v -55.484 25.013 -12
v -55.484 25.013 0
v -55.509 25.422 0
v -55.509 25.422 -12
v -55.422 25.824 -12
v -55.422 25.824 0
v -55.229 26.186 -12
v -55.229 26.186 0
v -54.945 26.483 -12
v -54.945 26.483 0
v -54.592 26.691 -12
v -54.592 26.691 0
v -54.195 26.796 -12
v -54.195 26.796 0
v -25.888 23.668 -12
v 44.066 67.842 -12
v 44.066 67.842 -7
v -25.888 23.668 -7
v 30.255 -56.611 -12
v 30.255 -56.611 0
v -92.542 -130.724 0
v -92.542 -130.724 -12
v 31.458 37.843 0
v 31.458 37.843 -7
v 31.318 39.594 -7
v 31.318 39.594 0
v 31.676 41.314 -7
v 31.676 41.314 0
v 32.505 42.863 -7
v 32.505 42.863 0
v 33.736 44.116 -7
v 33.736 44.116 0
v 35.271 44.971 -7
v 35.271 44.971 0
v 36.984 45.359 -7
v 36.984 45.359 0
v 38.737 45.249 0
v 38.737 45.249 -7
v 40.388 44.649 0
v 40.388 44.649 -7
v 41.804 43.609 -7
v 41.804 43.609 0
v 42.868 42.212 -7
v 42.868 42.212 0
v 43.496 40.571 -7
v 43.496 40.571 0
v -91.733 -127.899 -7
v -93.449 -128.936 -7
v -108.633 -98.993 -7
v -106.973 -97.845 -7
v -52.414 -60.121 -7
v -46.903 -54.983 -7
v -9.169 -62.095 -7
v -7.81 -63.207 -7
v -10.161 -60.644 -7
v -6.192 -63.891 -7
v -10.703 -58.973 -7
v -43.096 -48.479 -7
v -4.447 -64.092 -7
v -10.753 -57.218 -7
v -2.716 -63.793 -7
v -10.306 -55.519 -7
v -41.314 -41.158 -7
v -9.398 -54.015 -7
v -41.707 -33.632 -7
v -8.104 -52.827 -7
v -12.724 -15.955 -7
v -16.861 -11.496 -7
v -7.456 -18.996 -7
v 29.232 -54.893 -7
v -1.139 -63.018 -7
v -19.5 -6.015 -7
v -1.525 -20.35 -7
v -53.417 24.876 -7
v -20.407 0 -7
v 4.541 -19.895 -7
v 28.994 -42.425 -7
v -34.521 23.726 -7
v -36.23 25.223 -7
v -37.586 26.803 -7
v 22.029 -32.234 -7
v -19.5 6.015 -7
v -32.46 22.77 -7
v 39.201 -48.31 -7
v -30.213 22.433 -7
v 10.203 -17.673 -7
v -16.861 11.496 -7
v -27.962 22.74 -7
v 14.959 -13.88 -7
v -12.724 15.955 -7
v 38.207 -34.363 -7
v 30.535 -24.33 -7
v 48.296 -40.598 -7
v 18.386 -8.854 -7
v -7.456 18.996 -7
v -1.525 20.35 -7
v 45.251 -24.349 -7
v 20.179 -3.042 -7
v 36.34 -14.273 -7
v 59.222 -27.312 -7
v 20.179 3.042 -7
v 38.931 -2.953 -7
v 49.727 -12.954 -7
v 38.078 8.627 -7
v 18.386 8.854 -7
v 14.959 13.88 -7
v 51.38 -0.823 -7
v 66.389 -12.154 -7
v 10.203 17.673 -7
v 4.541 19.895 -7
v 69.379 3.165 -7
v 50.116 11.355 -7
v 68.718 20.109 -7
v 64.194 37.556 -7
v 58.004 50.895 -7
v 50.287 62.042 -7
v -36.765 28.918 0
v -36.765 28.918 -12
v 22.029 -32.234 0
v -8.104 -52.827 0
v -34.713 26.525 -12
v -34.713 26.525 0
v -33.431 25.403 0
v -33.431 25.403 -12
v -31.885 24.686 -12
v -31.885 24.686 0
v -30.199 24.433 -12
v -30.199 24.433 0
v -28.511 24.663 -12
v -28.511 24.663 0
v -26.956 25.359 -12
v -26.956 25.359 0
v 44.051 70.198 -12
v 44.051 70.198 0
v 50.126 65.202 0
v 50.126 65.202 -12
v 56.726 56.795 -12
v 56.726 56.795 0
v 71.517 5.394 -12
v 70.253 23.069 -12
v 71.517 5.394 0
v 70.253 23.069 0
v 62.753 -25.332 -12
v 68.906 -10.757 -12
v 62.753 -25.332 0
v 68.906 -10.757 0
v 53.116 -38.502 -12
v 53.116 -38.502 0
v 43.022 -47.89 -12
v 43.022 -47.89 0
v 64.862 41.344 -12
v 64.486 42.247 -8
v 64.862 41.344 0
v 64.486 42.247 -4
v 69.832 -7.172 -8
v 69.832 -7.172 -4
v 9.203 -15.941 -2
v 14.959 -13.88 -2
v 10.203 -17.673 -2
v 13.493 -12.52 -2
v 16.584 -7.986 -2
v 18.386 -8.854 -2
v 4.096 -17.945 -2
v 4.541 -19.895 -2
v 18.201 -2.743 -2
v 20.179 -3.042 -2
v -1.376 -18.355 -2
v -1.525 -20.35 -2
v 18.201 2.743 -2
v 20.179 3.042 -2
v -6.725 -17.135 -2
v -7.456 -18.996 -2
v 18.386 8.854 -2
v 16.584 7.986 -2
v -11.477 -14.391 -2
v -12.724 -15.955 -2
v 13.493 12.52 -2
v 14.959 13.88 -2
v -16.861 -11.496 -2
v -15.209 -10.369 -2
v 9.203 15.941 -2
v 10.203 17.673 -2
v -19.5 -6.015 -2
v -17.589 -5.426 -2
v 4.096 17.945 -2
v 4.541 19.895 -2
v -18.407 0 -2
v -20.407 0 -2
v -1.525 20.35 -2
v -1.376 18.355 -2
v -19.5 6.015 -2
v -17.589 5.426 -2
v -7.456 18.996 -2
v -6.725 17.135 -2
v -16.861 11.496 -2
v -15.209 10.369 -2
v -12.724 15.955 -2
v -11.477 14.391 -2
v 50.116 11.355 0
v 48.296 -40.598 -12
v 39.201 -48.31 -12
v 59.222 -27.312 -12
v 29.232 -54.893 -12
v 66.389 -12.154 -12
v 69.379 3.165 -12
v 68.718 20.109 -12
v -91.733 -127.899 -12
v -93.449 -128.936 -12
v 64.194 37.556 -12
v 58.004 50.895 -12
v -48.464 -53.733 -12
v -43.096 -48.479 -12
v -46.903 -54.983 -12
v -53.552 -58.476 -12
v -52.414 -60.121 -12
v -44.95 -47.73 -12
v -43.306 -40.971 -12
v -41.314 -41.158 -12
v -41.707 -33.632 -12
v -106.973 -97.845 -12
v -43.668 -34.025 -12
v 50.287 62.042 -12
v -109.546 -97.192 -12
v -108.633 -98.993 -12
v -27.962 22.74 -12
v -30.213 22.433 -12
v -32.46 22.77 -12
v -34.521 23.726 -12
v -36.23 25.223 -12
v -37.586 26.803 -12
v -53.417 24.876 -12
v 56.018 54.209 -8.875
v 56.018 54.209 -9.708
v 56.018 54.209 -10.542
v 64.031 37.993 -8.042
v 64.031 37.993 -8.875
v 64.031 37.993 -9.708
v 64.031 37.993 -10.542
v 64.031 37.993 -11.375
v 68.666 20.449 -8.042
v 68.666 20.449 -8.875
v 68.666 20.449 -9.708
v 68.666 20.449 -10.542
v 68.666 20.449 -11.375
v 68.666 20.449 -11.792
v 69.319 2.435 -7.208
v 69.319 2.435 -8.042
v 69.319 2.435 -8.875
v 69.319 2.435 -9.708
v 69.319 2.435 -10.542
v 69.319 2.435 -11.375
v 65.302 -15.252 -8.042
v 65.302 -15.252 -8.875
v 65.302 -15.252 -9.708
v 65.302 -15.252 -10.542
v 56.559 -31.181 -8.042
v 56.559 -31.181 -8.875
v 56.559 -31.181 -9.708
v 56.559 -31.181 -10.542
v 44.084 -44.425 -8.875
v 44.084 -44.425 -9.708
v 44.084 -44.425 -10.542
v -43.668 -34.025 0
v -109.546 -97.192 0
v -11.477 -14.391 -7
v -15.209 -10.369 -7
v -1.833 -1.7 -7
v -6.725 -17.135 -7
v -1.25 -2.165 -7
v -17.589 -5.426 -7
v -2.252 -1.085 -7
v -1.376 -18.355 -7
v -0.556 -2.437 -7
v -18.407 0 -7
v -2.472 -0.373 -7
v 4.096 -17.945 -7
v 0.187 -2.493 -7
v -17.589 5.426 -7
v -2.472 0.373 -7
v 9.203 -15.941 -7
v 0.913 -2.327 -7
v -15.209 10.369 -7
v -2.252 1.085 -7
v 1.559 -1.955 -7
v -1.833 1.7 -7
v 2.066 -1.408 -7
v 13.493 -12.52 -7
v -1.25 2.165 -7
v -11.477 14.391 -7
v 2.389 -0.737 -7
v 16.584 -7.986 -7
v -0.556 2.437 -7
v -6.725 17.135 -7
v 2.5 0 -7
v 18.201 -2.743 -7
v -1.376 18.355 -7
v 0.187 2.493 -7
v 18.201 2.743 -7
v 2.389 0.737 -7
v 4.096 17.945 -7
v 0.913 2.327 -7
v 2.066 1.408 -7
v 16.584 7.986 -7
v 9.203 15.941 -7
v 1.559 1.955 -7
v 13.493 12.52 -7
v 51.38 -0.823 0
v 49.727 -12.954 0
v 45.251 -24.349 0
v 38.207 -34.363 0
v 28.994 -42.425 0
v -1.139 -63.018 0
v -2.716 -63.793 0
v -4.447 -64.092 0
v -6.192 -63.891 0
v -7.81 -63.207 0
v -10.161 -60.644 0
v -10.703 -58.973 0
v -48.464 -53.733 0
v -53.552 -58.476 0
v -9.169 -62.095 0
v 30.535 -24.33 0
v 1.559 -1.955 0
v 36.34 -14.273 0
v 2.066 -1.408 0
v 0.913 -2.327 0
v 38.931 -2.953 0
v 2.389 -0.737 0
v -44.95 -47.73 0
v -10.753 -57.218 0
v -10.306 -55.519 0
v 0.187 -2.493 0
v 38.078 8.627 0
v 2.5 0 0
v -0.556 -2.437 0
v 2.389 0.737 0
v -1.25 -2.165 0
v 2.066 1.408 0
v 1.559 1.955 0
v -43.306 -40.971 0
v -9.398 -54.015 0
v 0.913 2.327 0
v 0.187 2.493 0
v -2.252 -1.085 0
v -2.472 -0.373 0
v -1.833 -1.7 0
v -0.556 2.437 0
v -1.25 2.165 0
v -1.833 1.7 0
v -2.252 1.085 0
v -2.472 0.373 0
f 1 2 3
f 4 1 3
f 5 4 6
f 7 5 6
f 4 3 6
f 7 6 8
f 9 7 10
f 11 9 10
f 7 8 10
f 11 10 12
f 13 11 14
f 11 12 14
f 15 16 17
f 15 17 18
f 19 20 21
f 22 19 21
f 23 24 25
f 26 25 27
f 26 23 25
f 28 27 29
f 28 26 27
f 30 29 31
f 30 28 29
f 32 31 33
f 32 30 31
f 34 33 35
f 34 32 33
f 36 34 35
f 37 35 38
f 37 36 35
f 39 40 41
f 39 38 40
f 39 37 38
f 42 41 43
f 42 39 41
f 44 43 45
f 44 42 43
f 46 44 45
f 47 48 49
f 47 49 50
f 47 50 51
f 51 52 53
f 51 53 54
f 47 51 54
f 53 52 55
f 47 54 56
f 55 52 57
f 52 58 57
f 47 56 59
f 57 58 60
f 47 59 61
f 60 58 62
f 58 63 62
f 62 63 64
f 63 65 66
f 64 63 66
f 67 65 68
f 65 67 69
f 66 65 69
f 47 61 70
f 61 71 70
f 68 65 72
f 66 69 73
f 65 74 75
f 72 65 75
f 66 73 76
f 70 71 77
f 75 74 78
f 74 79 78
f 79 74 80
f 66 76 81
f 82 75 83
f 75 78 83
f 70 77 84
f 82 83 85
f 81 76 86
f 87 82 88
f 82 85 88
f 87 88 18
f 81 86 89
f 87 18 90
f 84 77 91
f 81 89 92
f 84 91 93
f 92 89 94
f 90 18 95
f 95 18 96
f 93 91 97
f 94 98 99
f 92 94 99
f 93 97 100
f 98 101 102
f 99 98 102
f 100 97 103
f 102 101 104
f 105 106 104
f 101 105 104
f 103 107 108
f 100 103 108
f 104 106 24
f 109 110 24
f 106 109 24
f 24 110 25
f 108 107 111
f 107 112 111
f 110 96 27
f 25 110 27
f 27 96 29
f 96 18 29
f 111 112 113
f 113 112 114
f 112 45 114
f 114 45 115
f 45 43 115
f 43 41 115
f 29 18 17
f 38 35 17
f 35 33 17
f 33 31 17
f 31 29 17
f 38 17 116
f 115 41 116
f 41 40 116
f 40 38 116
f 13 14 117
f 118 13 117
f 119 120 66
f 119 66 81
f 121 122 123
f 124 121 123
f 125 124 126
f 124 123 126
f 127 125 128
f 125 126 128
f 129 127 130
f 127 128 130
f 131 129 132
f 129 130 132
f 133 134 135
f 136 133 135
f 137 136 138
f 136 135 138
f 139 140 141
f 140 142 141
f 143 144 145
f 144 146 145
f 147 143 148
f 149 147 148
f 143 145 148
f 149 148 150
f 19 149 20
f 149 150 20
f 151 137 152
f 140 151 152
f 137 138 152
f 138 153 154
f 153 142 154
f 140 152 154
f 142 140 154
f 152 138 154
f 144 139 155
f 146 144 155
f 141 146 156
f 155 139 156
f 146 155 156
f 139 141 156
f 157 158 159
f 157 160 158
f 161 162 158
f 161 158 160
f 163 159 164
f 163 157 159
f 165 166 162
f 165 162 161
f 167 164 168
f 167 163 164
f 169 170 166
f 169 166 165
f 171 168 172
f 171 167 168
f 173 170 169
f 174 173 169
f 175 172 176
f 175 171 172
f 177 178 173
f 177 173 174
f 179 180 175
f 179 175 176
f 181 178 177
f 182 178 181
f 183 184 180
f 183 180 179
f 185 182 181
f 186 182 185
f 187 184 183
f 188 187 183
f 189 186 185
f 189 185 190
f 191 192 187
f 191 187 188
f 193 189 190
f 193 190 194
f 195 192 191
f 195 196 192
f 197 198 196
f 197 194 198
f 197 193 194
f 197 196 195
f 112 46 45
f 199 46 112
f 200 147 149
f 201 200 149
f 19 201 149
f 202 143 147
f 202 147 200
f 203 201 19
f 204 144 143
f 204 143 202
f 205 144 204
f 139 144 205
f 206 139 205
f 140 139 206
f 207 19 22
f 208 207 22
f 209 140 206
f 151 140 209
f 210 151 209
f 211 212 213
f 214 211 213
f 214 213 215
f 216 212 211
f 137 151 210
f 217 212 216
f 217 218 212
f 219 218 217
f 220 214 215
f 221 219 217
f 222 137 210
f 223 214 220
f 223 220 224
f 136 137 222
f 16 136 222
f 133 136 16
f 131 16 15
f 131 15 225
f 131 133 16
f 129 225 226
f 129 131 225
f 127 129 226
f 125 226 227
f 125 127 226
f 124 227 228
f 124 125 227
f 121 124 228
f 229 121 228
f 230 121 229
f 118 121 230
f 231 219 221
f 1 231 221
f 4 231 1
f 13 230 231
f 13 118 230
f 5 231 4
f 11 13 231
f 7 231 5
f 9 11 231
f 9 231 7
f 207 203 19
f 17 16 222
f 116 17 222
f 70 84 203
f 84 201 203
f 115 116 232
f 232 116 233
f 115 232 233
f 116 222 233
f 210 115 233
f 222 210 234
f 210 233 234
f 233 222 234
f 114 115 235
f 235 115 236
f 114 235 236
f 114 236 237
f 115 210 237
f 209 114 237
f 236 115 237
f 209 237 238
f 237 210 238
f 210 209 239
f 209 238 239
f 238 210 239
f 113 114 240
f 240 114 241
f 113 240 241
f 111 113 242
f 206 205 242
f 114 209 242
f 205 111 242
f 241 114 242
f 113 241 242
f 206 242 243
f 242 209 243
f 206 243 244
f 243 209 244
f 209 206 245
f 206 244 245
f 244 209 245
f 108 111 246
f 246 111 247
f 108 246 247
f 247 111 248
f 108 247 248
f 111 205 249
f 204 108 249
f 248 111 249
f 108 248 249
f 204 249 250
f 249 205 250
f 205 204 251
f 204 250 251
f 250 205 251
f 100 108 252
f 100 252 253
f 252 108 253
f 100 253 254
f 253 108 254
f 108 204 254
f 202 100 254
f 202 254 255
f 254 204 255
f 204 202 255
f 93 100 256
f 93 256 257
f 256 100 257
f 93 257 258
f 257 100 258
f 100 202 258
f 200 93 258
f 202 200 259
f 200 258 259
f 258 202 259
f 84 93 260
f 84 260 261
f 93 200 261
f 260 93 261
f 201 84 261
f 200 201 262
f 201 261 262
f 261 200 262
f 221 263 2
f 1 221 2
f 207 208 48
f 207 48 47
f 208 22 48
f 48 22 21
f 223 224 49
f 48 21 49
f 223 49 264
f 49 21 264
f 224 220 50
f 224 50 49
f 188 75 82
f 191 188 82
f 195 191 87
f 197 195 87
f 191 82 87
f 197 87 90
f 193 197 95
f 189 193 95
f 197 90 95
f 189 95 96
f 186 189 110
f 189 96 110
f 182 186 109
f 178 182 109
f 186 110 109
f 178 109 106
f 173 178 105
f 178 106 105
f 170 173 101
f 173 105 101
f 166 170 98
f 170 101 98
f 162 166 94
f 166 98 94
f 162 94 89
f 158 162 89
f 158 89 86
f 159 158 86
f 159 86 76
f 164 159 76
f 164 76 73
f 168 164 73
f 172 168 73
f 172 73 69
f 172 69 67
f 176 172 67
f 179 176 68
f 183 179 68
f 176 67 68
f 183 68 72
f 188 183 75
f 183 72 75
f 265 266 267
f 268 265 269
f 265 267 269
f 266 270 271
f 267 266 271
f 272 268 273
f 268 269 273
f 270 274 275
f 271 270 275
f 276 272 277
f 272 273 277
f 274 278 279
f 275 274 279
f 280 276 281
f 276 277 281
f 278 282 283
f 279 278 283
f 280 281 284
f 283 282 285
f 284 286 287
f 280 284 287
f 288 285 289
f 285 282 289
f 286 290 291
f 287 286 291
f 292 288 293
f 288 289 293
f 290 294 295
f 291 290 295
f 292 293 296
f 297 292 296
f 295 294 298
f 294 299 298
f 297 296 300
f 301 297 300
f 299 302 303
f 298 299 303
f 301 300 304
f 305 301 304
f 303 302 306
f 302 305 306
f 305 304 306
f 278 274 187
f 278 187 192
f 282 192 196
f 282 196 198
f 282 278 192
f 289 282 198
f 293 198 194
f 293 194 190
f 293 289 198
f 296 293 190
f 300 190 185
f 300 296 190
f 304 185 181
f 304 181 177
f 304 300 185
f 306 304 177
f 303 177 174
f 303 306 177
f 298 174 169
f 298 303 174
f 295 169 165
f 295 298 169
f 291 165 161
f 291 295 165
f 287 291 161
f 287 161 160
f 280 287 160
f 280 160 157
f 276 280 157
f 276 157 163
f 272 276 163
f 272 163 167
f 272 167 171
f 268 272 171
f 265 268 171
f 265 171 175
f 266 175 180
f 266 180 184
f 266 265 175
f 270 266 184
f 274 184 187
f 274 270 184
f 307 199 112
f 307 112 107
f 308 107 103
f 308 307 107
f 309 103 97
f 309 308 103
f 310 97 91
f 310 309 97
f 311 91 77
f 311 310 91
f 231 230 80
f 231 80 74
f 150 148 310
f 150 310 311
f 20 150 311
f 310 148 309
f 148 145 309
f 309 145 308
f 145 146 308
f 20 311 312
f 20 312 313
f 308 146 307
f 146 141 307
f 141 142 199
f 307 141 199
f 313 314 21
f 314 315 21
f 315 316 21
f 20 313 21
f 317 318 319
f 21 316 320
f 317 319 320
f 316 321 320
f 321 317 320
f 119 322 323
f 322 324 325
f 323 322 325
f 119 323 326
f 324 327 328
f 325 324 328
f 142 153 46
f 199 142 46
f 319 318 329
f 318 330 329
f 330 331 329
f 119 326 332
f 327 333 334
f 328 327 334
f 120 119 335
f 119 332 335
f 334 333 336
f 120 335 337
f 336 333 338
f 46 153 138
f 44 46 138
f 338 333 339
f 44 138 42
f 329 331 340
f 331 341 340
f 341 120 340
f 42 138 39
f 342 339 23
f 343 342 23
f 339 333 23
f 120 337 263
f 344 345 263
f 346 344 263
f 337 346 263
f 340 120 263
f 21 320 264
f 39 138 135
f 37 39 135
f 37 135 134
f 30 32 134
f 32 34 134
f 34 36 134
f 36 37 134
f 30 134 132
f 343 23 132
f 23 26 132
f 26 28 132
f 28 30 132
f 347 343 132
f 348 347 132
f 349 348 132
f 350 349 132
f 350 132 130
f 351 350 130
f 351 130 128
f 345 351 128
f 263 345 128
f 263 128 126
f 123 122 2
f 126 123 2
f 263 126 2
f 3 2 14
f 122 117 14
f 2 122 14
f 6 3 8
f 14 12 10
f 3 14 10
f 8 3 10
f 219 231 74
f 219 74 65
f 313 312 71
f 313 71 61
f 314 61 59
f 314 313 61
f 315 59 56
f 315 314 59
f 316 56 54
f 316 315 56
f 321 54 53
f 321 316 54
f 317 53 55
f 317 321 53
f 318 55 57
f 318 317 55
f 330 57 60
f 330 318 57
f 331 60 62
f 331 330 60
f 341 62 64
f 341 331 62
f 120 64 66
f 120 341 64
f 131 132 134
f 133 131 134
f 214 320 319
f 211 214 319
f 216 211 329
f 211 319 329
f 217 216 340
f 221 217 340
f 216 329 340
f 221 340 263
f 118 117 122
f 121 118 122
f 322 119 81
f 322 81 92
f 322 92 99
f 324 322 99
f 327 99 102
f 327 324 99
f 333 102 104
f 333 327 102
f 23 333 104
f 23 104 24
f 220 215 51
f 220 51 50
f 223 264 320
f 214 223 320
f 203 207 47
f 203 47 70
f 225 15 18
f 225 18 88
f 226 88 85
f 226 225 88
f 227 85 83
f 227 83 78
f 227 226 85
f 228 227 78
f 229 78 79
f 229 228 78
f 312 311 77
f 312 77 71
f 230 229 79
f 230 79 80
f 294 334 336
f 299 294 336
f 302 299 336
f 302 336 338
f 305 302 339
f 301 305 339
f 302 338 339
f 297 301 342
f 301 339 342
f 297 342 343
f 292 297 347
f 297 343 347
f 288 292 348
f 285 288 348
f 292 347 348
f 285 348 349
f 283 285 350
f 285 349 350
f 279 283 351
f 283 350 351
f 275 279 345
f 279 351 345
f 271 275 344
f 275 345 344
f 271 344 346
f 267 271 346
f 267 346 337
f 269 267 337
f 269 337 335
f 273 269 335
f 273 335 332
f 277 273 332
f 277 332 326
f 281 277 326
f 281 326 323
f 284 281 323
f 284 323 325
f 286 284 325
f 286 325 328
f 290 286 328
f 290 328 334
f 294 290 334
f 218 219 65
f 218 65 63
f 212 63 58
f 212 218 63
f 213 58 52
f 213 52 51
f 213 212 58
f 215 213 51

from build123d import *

# Parameters (mm, degrees)
SKETCH1_R           = 2.5
BOSS_EXTRUDE1_DEPTH = 12
CUT_EXTRUDE2_DEPTH  = 5
SKETCH2_R           = 20.406966807
SKETCH2_R_2         = 18.406966807
CUT_EXTRUDE1_DEPTH  = 5


with BuildPart() as part:
    # Sketch1 → Boss-Extrude1 (new body)
    with BuildSketch(Plane.XY):
        with BuildLine():
            Line((-26.955627075, 25.359398414), (44.050751749, 70.198338512))
            add(Edge.make_bspline(
                [(44.050751749, 70.198338512), (62.087157858, 60.129124735), (102.236821697, -14.309839041), (30.255220871, -56.610877482)],
                knots=[0, 0, 0, 0, 1, 1, 1, 1], degree=3))
            Line((30.255220871, -56.610877482), (-92.542495842, -130.724182913))
            Line((-92.542495842, -130.724182913), (-109.546280871, -97.192243206))
            Line((-109.546280871, -97.192243206), (-53.551819625, -58.475967995))
            ThreePointArc((-53.551819625, -58.475967995), (-44.950344781, -47.729789478), (-43.667906214, -34.025006607))
            Line((-43.667906214, -34.025006607), (-55.484471769, 25.012678553))
            ThreePointArc((-55.484471769, 25.012678553), (-55.229156607, 26.186005417), (-54.194896814, 26.796077907))
            Line((-54.194896814, 26.796077907), (-36.765460017, 28.917713338))
            Line((-36.765460017, 28.917713338), (-34.712668517, 26.525380142))
            ThreePointArc((-34.712668517, 26.525380142), (-31.051074716, 24.4992182), (-26.955627075, 25.359398414))
        make_face()
        Circle(SKETCH1_R, mode=Mode.SUBTRACT)
        with BuildLine():
            Line((38.077539086, 8.627342387), (31.457970773, 37.843392922))
            ThreePointArc((31.457970773, 37.843392922), (36.113405951, 45.226418252), (43.49643128, 40.570983074))
            Line((43.49643128, 40.570983074), (50.115999593, 11.354932539))
            ThreePointArc((50.115999593, 11.354932539), (47.829544092, -18.785170217), (28.993629861, -42.425432651))
            Line((28.993629861, -42.425432651), (-1.139071825, -63.018184329))
            ThreePointArc((-1.139071825, -63.018184329), (-9.716926906, -61.404944758), (-8.103687335, -52.827089677))
            Line((-8.103687335, -52.827089677), (22.029014352, -32.234337999))
            ThreePointArc((22.029014352, -32.234337999), (36.340317452, -14.272748403), (38.077539086, 8.627342387))
        make_face(mode=Mode.SUBTRACT)
    extrude(amount=-BOSS_EXTRUDE1_DEPTH)

    # Sketch3 → Cut-Extrude2 (cut)
    with BuildSketch(Plane(origin=(0, 0, -12), x_dir=(-1, 0, 0), z_dir=(0, 0, -1))):
        with BuildLine():
            Line((108.633361408, -98.992545924), (93.449492386, -128.935560359))
            Line((93.449492386, -128.935560359), (91.732523821, -127.89930155))
            Line((91.732523821, -127.89930155), (-29.231808811, -54.892516323))
            add(Edge.make_bspline(
                [(-44.065734477, 67.842412696), (-44.711989199, 67.409412256), (-45.319058391, 66.940521732), (-46.487121265, 65.960540056), (-47.04734625, 65.448744854), (-48.676831708, 63.866474713), (-49.695652132, 62.74980166), (-51.643061578, 60.433812481), (-52.570637695, 59.233568633), (-54.351661803, 56.76518688), (-55.206220539, 55.494184071), (-57.642169465, 51.637395526), (-59.108475151, 48.994377471), (-61.772216068, 43.585851359), (-62.968525898, 40.819830599), (-64.562191776, 36.579321004), (-65.059713989, 35.150465126), (-65.753925807, 32.983458962), (-65.976639631, 32.257164595), (-66.404295719, 30.796479627), (-66.609516748, 30.060994816), (-67.585549406, 26.379930292), (-68.207997329, 23.421535241), (-69.124162601, 17.476634327), (-69.417856055, 14.49012642), (-69.647875237, 8.486550939), (-69.584312973, 5.469492942), (-69.186185446, 0.918013899), (-69.001954276, -0.606436507), (-68.53395704, -3.614530288), (-68.249900615, -5.10403396), (-67.246805131, -9.528696616), (-66.377032654, -12.420063251), (-64.763908669, -16.667495261), (-64.174739481, -18.06835499), (-63.212508348, -20.146844678), (-62.87805617, -20.837039742), (-62.187699389, -22.200245629), (-61.831475952, -22.874060854), (-59.996492333, -26.20515645), (-58.3564207, -28.748698204), (-54.76187252, -33.614098874), (-52.807325031, -35.935907769), (-49.657387027, -39.264829798), (-48.576129174, -40.343226595), (-46.36681057, -42.431345516), (-45.23699415, -43.442927339), (-39.471767159, -48.350894333), (-34.491238963, -51.801735421), (-29.231808811, -54.892516323)],
                knots=[0, 0, 0, 0, 0.015625, 0.015625, 0.03125, 0.03125, 0.0625, 0.0625, 0.09375, 0.09375, 0.125, 0.125, 0.1875, 0.1875, 0.25, 0.25, 0.28125, 0.28125, 0.296875, 0.296875, 0.3125, 0.3125, 0.375, 0.375, 0.4375, 0.4375, 0.5, 0.5, 0.53125, 0.53125, 0.5625, 0.5625, 0.625, 0.625, 0.65625, 0.65625, 0.671875, 0.671875, 0.6875, 0.6875, 0.75, 0.75, 0.8125, 0.8125, 0.84375, 0.84375, 0.875, 0.875, 1, 1, 1, 1], degree=3))
            Line((-44.065734477, 67.842412696), (25.887763568, 23.668343261))
            ThreePointArc((25.887763568, 23.668343261), (31.348360423, 22.521436309), (36.230485491, 25.222985565))
            Line((36.230485491, 25.222985565), (37.586279366, 26.80303434))
            Line((37.586279366, 26.80303434), (53.417437888, 24.875952746))
            Line((53.417437888, 24.875952746), (41.706802558, -33.632485968))
            ThreePointArc((41.706802558, -33.632485968), (43.096111006, -48.479334078), (52.414375421, -60.121027471))
            Line((52.414375421, -60.121027471), (106.973050581, -97.844556472))
            Line((106.973050581, -97.844556472), (108.633361408, -98.992545924))
        make_face()
    extrude(amount=-CUT_EXTRUDE2_DEPTH, mode=Mode.SUBTRACT)

    # Sketch2 → Cut-Extrude1 (cut)
    with BuildSketch(Plane(origin=(0, 0, -7), x_dir=(-1, 0, 0), z_dir=(0, 0, -1))):
        Circle(SKETCH2_R)
        Circle(SKETCH2_R_2, mode=Mode.SUBTRACT)
    extrude(amount=-CUT_EXTRUDE1_DEPTH, mode=Mode.SUBTRACT)


solid = part.part
